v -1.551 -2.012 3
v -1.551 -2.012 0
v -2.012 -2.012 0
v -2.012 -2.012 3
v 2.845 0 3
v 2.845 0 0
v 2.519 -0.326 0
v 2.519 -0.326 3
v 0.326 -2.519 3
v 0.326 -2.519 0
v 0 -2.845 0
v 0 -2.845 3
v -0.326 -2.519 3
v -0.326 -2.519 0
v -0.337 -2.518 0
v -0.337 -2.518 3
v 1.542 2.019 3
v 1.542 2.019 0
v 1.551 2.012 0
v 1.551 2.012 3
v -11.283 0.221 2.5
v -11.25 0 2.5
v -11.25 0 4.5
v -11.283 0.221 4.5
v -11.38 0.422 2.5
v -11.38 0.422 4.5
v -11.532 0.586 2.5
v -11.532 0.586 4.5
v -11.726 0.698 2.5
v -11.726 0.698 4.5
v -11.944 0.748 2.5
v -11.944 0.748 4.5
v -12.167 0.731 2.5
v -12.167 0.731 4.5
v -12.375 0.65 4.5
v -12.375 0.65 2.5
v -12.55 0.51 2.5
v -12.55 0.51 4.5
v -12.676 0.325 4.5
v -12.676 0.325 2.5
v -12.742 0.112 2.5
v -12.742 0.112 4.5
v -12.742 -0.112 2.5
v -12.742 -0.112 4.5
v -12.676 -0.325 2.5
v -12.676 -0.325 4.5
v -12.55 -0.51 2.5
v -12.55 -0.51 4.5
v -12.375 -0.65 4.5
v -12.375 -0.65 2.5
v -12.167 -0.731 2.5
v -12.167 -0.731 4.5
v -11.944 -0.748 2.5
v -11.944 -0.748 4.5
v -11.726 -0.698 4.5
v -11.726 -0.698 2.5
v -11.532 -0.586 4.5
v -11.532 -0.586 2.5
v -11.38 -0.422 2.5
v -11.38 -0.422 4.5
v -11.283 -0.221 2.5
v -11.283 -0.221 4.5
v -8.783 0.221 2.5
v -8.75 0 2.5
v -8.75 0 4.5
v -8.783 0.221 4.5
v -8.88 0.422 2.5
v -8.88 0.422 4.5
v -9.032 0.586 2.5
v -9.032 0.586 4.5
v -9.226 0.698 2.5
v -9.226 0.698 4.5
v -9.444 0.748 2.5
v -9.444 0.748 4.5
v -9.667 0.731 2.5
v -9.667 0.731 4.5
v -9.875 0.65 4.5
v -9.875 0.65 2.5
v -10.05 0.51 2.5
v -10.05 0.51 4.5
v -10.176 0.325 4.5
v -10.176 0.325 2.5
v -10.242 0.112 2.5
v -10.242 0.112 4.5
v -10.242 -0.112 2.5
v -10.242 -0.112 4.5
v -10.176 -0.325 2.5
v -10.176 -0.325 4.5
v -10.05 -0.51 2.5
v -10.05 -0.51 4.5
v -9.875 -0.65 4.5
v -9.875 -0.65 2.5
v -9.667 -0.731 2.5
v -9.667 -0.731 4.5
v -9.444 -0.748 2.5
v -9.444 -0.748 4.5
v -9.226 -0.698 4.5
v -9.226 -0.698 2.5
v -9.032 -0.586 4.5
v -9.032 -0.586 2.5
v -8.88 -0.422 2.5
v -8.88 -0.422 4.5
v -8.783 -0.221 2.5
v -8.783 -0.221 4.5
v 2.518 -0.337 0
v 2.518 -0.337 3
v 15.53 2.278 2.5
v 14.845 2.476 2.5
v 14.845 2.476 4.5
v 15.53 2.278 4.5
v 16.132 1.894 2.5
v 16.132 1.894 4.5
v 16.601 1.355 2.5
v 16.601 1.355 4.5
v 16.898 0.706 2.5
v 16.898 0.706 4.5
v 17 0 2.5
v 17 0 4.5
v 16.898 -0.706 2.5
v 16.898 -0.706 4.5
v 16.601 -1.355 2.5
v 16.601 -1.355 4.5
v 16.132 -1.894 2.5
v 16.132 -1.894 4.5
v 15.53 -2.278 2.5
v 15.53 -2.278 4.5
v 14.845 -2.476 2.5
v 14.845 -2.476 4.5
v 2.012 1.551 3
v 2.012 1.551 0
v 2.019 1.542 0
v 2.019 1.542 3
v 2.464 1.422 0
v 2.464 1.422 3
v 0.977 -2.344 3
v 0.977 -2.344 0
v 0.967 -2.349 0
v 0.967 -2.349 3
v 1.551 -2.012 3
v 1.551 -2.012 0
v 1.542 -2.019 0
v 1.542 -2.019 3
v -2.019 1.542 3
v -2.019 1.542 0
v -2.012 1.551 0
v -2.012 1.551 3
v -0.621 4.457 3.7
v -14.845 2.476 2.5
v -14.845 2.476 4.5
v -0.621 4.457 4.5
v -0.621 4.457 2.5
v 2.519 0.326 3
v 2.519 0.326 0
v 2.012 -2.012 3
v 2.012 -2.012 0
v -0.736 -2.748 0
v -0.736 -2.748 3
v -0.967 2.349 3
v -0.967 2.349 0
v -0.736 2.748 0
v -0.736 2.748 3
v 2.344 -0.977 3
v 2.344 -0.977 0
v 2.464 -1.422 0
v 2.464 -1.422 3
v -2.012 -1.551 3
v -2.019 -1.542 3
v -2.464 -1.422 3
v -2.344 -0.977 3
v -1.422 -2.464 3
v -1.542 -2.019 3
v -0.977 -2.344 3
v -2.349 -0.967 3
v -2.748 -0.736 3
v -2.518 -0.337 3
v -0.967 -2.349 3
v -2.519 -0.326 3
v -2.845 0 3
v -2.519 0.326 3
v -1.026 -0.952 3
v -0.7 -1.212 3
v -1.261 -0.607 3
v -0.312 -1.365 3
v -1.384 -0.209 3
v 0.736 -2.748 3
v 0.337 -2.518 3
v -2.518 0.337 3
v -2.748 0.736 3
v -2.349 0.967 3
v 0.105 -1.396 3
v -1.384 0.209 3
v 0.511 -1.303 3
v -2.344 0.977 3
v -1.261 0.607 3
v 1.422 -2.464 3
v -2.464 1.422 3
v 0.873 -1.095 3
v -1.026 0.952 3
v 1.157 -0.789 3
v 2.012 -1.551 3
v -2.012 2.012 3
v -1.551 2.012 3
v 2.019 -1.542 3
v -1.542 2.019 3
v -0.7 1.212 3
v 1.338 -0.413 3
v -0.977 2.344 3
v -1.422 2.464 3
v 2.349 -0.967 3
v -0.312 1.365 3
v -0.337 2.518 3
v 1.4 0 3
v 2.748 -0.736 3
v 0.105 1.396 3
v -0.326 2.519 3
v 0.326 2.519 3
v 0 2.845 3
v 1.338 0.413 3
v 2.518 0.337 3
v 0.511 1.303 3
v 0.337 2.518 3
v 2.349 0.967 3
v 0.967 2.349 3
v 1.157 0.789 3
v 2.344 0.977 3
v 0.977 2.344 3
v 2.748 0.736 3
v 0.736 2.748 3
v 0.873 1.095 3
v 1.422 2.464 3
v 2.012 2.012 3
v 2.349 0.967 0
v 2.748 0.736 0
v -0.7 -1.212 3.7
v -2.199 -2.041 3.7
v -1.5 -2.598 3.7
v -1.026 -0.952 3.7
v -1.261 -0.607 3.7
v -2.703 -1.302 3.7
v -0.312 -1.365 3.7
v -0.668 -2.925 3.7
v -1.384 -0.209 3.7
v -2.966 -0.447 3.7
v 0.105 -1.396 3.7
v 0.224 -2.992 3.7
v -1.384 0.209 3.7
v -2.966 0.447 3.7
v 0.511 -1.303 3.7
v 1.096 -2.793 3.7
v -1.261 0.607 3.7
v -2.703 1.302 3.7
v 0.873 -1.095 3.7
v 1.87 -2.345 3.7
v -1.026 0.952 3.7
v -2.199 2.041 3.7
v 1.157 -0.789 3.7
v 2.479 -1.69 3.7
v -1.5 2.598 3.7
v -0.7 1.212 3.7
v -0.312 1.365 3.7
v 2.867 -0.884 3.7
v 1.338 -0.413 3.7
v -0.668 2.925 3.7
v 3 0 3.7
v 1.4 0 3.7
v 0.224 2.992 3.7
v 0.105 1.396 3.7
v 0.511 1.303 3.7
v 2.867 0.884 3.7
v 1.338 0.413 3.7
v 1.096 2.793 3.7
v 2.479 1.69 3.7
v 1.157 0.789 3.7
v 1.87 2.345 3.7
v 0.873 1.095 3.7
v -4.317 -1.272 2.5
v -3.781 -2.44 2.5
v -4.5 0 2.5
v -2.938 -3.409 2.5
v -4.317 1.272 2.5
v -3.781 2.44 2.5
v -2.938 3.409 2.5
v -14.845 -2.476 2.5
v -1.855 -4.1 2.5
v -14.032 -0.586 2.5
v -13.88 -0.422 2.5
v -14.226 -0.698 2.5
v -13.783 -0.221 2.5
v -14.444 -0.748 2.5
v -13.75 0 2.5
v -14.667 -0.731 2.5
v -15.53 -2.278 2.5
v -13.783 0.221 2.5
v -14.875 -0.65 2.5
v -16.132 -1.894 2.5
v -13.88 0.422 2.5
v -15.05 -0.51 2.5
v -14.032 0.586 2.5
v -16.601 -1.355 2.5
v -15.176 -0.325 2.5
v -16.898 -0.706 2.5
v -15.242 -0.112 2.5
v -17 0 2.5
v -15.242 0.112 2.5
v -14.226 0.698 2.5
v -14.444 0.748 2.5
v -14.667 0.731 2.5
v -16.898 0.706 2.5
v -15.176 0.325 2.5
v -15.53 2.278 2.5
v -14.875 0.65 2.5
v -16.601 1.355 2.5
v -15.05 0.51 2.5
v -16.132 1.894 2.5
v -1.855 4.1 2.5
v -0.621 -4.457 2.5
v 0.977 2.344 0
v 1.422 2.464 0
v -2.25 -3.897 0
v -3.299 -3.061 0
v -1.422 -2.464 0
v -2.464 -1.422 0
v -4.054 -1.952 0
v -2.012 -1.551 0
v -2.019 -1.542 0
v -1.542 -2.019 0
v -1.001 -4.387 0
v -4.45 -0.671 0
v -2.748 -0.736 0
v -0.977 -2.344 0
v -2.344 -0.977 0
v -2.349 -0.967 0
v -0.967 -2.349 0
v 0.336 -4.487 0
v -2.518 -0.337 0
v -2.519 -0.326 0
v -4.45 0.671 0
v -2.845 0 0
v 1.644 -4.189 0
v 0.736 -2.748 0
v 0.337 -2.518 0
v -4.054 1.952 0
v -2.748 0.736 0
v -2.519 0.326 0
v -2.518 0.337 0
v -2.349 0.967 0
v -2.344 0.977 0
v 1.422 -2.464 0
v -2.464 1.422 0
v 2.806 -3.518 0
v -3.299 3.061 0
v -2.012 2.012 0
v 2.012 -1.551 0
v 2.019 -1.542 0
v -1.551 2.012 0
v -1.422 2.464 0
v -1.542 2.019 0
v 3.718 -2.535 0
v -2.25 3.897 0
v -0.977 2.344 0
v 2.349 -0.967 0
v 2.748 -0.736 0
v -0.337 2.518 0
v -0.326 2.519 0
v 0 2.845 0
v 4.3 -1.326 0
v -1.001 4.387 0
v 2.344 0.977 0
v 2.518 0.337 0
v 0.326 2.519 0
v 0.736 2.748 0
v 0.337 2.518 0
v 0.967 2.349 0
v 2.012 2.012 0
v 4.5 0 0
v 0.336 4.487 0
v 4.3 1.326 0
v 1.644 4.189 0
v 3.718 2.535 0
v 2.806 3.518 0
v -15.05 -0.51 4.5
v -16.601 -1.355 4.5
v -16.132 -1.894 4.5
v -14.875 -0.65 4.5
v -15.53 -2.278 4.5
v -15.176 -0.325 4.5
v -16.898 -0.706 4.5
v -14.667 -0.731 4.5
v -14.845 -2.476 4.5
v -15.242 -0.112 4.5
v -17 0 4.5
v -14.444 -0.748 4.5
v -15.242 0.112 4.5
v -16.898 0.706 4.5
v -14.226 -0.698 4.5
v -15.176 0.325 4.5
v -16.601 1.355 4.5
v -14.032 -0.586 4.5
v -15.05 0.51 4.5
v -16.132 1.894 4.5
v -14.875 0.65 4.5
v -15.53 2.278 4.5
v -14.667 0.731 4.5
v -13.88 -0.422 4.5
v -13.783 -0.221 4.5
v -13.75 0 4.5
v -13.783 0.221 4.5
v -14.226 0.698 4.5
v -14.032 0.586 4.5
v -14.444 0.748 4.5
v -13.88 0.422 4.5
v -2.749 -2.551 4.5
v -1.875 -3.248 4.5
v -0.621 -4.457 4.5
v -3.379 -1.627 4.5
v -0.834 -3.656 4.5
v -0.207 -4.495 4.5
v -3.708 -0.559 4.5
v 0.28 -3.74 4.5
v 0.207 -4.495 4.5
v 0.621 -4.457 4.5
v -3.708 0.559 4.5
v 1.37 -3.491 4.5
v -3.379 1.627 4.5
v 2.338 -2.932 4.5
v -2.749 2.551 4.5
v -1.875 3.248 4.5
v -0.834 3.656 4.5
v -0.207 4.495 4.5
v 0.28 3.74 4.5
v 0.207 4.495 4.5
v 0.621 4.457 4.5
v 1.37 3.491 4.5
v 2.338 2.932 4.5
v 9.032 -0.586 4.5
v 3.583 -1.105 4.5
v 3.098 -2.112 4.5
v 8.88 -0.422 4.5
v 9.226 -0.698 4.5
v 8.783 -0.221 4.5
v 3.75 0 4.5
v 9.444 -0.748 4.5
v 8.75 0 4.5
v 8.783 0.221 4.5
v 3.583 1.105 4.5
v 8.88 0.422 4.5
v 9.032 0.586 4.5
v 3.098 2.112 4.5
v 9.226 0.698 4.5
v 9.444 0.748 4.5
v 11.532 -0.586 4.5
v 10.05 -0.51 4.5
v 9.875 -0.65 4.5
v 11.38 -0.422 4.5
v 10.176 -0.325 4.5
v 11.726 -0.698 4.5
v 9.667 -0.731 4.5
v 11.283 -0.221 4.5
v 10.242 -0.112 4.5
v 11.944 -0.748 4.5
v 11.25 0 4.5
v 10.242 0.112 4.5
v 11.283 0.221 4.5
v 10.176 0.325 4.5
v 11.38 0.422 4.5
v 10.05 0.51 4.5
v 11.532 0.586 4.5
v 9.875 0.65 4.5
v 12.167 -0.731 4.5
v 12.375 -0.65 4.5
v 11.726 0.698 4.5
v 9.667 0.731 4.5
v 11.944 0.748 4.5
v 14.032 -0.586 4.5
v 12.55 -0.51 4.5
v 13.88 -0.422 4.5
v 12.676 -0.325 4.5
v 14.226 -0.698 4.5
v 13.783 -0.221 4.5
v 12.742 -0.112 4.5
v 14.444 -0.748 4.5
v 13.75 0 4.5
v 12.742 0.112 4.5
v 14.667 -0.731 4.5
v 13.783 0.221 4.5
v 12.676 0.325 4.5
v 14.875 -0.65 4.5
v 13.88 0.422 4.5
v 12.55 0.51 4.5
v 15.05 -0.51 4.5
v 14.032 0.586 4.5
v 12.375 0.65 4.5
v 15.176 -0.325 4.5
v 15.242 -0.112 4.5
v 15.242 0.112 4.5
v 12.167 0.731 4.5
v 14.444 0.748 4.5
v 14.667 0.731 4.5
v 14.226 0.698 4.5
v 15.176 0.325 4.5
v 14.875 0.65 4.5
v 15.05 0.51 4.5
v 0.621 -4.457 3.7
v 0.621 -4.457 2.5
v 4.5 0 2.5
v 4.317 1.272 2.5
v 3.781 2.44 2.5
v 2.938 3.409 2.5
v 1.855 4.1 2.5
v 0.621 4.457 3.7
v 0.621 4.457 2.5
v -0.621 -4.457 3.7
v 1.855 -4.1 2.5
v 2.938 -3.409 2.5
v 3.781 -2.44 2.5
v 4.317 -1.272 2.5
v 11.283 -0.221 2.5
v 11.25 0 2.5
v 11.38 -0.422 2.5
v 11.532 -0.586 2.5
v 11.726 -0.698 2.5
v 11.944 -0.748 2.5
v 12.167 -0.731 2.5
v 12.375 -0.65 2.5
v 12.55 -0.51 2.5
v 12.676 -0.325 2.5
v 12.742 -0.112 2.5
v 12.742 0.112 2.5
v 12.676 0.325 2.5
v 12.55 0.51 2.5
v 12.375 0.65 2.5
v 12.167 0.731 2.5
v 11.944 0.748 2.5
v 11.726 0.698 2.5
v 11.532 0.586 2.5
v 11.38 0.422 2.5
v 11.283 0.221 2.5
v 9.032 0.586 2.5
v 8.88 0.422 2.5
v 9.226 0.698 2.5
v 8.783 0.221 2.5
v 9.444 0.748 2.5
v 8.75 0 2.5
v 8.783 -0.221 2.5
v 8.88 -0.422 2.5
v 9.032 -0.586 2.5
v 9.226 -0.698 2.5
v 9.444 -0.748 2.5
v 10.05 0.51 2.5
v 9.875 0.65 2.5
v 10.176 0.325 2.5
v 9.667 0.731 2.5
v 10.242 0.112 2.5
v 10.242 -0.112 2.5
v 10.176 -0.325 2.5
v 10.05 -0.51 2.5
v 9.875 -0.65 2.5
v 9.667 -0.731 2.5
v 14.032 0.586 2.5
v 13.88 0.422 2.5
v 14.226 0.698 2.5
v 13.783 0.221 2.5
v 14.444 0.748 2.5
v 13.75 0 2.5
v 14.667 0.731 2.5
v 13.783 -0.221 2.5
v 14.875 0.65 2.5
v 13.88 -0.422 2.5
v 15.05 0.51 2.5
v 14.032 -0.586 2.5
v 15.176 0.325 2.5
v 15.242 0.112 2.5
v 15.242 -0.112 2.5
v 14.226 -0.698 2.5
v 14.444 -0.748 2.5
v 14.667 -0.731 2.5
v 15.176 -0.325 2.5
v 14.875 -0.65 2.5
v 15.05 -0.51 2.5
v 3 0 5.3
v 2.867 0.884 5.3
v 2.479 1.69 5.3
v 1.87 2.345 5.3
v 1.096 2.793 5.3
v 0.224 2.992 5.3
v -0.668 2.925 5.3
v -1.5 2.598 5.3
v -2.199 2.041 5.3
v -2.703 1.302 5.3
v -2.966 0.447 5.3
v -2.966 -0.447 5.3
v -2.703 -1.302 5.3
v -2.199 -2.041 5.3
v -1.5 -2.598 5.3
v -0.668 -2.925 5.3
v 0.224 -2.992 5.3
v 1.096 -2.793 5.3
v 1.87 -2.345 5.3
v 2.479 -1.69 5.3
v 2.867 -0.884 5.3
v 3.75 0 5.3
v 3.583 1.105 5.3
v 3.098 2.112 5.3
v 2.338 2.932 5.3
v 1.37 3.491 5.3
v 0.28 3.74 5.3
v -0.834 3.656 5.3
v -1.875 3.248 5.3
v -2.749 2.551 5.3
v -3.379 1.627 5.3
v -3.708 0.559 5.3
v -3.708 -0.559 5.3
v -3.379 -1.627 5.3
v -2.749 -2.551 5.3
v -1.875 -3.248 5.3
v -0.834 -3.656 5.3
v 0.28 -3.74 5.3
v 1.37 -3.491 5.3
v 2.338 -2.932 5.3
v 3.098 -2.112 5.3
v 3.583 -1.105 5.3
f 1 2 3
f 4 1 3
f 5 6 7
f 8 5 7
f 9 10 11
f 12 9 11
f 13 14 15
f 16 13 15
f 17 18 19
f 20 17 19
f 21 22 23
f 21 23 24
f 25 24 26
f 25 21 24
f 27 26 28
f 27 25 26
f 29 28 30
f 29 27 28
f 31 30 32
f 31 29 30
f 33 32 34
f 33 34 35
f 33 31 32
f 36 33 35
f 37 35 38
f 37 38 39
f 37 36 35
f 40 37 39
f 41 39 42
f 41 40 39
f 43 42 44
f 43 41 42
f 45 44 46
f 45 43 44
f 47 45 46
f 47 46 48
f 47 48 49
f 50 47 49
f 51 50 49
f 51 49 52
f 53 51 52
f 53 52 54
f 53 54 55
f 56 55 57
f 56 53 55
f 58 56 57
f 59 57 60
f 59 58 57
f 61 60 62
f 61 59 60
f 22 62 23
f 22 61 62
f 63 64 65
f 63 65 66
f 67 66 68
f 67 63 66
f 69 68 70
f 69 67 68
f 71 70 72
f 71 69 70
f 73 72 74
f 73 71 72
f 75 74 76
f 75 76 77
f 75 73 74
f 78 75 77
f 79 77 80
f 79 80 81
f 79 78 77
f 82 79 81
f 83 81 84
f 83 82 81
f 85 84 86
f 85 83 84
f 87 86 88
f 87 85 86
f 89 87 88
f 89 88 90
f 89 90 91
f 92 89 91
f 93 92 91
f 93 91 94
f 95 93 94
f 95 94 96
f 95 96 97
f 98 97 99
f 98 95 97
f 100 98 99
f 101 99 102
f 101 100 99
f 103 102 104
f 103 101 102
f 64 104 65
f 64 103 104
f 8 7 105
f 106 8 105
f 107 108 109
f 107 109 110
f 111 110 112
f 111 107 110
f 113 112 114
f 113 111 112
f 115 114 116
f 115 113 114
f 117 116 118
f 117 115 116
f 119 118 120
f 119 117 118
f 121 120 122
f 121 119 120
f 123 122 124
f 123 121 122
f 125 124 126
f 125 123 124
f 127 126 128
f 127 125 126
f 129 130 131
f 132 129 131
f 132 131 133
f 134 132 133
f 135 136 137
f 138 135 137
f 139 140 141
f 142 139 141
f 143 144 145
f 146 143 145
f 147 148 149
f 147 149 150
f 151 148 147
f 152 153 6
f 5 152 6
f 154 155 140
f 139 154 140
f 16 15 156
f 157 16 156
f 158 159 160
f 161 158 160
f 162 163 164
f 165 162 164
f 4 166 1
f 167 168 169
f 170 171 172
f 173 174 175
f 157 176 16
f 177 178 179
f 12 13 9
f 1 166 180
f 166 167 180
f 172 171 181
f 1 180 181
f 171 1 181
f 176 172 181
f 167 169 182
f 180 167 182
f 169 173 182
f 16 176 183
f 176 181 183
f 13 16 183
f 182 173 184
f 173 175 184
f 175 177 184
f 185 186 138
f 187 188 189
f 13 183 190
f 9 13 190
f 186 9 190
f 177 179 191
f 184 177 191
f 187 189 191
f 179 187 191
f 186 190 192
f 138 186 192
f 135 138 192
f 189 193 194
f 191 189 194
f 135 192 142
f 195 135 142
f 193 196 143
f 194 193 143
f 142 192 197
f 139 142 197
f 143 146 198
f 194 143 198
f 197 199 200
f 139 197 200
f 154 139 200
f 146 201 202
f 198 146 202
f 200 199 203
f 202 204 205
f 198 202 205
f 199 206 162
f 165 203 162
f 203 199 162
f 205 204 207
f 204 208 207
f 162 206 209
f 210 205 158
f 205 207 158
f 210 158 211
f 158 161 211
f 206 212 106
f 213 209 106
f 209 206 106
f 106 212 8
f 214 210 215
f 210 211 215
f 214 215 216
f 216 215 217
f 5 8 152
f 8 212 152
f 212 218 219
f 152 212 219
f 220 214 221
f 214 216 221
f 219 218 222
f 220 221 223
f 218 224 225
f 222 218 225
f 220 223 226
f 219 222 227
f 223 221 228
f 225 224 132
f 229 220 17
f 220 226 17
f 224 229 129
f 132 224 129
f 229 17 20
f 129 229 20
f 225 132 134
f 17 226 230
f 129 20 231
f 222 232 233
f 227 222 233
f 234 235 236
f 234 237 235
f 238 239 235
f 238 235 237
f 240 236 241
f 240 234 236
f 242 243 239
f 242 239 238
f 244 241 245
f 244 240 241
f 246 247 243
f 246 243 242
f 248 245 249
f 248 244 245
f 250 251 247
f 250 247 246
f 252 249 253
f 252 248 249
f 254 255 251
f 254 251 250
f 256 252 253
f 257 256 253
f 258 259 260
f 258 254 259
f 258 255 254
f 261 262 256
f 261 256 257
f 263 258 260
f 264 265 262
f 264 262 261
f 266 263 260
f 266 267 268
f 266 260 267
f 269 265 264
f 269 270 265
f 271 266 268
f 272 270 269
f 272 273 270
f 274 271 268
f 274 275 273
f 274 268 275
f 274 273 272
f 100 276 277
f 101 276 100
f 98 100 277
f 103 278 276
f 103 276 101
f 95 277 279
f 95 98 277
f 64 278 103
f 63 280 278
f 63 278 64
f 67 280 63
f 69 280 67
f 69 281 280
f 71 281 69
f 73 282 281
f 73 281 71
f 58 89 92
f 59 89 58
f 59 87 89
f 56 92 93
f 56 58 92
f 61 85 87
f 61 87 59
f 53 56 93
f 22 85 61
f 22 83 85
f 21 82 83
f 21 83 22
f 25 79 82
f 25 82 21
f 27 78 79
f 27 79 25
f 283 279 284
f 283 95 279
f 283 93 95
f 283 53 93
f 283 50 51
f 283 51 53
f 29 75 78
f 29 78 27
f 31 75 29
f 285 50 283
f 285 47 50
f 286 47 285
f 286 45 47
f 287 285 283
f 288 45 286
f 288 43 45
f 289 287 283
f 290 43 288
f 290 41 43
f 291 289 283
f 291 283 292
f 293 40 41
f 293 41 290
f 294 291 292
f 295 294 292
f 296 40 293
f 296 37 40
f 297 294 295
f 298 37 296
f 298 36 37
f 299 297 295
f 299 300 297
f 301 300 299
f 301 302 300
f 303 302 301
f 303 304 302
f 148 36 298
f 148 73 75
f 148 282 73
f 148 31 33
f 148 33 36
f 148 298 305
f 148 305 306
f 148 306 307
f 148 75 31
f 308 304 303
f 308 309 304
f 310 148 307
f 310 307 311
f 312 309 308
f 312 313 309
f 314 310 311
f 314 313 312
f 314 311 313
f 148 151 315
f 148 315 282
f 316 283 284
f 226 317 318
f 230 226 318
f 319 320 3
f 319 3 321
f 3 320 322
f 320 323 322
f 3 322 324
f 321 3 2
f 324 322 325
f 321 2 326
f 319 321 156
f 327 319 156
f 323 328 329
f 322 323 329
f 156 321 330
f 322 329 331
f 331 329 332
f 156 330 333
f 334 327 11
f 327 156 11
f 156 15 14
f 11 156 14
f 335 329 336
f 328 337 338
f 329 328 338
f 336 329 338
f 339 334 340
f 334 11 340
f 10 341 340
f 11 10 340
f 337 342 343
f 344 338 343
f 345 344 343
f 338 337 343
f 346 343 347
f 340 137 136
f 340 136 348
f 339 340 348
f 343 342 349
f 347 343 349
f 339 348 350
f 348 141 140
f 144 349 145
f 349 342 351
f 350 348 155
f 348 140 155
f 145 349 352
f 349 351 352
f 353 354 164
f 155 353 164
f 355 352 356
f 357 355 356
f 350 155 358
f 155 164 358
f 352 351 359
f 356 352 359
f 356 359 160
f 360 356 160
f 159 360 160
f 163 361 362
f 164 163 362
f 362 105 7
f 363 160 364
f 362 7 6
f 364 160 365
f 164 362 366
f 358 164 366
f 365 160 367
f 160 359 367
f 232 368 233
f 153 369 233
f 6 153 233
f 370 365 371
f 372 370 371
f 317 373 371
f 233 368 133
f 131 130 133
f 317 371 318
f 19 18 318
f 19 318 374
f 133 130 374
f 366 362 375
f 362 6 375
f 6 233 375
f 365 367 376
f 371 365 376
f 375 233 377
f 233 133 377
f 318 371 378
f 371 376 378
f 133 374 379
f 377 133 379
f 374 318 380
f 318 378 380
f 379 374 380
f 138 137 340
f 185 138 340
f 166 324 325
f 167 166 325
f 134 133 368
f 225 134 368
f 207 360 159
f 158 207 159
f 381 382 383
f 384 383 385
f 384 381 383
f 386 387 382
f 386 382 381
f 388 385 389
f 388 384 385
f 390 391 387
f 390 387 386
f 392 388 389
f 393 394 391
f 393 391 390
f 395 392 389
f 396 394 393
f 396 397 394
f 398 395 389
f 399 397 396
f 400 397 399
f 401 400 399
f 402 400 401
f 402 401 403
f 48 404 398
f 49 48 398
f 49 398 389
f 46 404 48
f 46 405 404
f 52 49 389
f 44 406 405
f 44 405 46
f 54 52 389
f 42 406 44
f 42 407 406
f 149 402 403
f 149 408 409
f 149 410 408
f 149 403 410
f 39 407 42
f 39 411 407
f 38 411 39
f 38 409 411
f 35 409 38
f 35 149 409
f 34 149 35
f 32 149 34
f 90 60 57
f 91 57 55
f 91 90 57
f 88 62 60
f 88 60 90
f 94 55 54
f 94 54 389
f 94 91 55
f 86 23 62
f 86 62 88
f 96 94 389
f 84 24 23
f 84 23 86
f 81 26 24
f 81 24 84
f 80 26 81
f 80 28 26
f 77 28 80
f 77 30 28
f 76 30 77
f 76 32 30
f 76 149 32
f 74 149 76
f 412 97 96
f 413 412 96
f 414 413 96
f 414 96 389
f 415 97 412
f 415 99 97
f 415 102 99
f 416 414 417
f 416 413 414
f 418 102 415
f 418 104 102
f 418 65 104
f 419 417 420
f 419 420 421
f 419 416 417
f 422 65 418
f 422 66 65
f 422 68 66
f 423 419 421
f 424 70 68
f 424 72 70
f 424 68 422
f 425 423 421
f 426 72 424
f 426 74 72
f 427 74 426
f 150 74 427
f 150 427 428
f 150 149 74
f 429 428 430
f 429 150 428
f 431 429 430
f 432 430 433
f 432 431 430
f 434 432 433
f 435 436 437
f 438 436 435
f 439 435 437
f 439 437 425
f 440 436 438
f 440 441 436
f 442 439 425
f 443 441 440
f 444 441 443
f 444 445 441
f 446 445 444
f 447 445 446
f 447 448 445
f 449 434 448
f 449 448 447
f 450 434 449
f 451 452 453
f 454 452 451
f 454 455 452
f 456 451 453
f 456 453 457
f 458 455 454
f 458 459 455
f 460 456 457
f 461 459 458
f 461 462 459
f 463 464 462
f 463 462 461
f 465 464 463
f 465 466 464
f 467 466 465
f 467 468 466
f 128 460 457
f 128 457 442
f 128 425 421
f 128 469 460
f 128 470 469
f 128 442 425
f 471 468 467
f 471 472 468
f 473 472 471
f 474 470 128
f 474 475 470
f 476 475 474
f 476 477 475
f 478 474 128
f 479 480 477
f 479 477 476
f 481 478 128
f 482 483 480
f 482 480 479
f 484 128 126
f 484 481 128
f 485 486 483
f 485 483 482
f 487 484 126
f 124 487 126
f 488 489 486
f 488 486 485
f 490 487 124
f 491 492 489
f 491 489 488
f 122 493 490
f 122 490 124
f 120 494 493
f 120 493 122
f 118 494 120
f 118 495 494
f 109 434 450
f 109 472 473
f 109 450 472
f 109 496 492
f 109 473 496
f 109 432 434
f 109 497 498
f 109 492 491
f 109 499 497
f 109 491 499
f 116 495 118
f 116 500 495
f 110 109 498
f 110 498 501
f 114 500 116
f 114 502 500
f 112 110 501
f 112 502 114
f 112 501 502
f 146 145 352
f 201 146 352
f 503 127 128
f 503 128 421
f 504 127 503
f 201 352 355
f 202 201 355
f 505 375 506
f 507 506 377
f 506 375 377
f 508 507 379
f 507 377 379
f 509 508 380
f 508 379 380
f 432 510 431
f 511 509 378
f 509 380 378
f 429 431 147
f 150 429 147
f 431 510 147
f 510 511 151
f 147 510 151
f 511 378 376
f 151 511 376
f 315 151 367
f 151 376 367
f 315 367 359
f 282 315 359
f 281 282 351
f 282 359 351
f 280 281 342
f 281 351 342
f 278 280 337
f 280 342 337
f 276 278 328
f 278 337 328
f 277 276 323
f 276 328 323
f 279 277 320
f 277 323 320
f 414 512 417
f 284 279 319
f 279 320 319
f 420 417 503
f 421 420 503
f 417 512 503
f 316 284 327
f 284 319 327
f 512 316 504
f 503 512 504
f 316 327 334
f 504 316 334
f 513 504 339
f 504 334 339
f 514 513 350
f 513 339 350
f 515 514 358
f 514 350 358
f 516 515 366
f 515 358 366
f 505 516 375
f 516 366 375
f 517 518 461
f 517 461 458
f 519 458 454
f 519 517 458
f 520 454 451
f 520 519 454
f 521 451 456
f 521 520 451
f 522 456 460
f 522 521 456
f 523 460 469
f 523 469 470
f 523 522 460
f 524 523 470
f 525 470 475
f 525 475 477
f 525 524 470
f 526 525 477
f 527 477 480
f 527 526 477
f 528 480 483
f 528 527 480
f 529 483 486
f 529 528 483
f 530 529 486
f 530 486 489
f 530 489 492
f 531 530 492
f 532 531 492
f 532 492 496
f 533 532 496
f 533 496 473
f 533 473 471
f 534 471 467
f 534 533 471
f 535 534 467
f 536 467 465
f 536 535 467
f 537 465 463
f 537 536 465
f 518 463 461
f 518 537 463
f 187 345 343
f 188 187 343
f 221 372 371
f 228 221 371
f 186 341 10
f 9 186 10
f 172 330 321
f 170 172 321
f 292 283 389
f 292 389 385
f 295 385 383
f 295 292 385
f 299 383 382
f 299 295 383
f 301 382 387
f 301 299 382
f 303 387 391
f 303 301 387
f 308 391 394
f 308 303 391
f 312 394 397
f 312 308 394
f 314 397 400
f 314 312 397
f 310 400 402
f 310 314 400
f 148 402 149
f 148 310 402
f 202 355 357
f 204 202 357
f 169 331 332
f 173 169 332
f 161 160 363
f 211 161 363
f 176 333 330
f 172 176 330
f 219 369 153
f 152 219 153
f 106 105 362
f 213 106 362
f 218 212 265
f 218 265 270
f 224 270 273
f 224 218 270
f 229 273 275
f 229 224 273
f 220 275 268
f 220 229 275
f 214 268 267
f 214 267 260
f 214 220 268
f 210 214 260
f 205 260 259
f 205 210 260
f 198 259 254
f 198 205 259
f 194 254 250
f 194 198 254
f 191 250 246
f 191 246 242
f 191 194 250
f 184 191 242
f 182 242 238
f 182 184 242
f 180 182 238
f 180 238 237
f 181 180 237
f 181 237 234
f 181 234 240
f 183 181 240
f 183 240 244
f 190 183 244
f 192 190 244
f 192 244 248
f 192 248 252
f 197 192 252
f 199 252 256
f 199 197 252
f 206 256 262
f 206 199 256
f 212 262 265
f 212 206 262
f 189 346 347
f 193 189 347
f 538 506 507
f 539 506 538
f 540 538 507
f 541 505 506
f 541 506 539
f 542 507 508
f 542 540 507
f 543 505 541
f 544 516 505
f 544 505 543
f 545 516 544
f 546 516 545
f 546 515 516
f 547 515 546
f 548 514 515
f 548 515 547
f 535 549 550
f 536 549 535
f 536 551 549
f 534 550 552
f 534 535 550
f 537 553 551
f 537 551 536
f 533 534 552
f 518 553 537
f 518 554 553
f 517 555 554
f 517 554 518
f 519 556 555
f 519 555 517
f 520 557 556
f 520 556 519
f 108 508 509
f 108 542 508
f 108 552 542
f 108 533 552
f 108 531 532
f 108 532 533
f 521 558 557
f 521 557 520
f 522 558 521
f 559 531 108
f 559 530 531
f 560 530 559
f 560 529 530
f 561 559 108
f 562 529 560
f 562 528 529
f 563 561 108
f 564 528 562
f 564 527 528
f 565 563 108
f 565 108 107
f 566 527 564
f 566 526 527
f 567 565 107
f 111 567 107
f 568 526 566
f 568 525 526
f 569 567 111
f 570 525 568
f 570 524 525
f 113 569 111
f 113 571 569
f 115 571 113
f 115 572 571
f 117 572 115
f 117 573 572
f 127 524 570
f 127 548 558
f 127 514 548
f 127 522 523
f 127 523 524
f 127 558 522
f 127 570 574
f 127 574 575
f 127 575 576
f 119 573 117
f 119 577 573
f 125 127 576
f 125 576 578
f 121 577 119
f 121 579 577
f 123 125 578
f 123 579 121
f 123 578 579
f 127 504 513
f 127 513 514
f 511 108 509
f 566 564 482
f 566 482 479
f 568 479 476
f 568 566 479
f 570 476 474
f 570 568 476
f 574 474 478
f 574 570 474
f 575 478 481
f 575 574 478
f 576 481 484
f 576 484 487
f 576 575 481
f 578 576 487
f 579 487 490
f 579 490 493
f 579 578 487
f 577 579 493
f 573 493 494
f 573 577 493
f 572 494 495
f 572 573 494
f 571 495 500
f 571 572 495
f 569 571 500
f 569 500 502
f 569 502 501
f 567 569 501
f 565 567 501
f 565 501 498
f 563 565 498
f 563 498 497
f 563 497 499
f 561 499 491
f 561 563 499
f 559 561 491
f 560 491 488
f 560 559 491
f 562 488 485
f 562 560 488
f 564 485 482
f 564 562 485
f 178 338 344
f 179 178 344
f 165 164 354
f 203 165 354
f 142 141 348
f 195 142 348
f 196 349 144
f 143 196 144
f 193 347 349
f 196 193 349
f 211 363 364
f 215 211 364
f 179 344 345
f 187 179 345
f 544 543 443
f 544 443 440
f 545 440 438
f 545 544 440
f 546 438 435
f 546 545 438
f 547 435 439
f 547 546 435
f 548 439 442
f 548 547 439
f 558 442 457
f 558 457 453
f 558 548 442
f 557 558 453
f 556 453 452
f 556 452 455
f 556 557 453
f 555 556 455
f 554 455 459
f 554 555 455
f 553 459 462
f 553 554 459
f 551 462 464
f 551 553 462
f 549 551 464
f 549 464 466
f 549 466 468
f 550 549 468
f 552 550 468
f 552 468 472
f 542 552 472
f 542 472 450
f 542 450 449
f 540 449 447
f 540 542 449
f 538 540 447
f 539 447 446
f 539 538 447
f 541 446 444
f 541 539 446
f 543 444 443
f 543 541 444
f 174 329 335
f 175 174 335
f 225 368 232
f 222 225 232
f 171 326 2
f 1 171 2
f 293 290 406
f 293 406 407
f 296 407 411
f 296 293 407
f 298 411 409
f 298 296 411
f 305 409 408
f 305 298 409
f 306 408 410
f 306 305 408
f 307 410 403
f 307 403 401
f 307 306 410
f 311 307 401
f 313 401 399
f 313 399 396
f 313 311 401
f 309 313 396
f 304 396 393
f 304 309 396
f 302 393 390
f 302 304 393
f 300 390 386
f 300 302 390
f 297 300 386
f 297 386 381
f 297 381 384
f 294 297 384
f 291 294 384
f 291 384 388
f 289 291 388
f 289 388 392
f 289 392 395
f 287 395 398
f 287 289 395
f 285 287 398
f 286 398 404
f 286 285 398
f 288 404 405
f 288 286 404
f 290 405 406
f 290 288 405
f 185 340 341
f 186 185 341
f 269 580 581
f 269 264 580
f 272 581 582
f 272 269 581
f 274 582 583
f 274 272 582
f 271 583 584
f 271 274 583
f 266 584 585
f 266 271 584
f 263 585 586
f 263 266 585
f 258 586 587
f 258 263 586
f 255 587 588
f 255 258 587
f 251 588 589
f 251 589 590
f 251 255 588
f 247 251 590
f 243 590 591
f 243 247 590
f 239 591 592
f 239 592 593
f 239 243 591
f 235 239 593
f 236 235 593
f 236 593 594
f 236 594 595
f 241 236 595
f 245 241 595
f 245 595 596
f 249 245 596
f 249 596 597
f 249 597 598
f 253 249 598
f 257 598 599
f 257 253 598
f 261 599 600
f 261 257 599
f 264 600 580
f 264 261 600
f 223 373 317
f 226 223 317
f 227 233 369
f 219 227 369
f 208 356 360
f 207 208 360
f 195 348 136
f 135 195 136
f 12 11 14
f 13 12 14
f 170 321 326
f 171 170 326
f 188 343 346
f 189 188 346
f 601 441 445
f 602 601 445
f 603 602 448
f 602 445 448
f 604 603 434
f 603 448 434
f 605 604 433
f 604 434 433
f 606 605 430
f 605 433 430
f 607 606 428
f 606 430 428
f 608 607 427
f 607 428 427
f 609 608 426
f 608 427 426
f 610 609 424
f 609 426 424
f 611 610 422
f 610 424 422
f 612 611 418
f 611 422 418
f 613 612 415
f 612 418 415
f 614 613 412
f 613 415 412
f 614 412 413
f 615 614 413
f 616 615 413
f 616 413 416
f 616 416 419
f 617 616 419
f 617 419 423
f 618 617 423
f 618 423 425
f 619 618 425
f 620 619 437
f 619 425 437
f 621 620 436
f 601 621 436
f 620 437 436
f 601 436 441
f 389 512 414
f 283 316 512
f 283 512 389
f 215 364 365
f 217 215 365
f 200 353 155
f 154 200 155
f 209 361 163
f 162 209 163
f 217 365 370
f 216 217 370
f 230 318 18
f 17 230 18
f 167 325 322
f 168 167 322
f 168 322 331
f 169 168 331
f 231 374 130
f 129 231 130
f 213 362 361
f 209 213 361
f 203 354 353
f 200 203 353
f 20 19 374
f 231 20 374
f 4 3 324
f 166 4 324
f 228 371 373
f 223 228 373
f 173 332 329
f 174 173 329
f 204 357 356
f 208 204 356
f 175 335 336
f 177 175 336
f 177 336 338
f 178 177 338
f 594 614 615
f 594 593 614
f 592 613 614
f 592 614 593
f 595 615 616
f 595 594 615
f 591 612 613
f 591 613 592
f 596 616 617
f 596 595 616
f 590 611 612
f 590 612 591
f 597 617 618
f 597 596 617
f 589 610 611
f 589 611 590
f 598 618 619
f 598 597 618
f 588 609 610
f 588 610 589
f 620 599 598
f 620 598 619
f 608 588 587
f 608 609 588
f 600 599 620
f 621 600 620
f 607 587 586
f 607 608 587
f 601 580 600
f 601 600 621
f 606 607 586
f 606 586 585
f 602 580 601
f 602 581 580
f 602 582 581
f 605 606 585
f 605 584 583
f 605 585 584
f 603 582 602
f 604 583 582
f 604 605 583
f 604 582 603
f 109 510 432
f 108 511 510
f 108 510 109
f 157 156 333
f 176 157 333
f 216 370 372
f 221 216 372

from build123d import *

# Parameters (mm, degrees)
ESQUISSE1_R                  = 4.5
BOSS_EXTRU_1_DEPTH           = 3
BOSS_EXTRU_2_START           = -0.5
ESQUISSE2_R                  = 0.75
BOSS_EXTRU_2_DEPTH           = 2
R_P_TITION_CIRCULAIRE1_COUNT = 2
ESQUISSE5_R                  = 4.5
ESQUISSE5_R_2                = 1.4
BOSS_EXTRU_4_DEPTH           = 0.7
ESQUISSE6_R                  = 4.5
ESQUISSE6_R_2                = 3
BOSS_EXTRU_5_DEPTH           = 0.8
ESQUISSE7_R                  = 3.75
ESQUISSE7_R_2                = 3
BOSS_EXTRU_6_DEPTH           = 0.8


with BuildPart() as part:
    # Esquisse1 → Boss.-Extru.1 (new body)
    with BuildSketch(Plane.XY):
        Circle(ESQUISSE1_R)
        Polygon((2.011577371, -1.550856692), (2.011577371, -2.011577371), (1.550856692, -2.011577371), (1.541643286, -2.018647066), (1.4224, -2.463669069), (0.977377998, -2.344425783), (0.966648759, -2.348869979), (0.73628842, -2.747865791), (0.337292608, -2.517505451), (0.325778716, -2.519021284), (0, -2.8448), (-0.325778716, -2.519021284), (-0.337292608, -2.517505451), (-0.73628842, -2.747865791), (-0.966648759, -2.348869979), (-0.977377998, -2.344425783), (-1.4224, -2.463669069), (-1.541643286, -2.018647066), (-1.550856692, -2.011577371), (-2.011577371, -2.011577371), (-2.011577371, -1.550856692), (-2.018647066, -1.541643286), (-2.463669069, -1.4224), (-2.344425783, -0.977377998), (-2.348869979, -0.966648759), (-2.747865791, -0.73628842), (-2.517505451, -0.337292608), (-2.519021284, -0.325778716), (-2.8448, 0), (-2.519021284, 0.325778716), (-2.517505451, 0.337292608), (-2.747865791, 0.73628842), (-2.348869979, 0.966648759), (-2.344425783, 0.977377998), (-2.463669069, 1.4224), (-2.018647066, 1.541643286), (-2.011577371, 1.550856692), (-2.011577371, 2.011577371), (-1.550856692, 2.011577371), (-1.541643286, 2.018647066), (-1.4224, 2.463669069), (-0.977377998, 2.344425783), (-0.966648759, 2.348869979), (-0.73628842, 2.747865791), (-0.337292608, 2.517505451), (-0.325778716, 2.519021284), (0, 2.8448), (0.325778716, 2.519021284), (0.337292608, 2.517505451), (0.73628842, 2.747865791), (0.966648759, 2.348869979), (0.977377998, 2.344425783), (1.4224, 2.463669069), (1.541643286, 2.018647066), (1.550856692, 2.011577371), (2.011577371, 2.011577371), (2.011577371, 1.550856692), (2.018647066, 1.541643286), (2.463669069, 1.4224), (2.344425783, 0.977377998), (2.348869979, 0.966648759), (2.747865791, 0.73628842), (2.517505451, 0.337292608), (2.519021284, 0.325778716), (2.8448, 0), (2.519021284, -0.325778716), (2.517505451, -0.337292608), (2.747865791, -0.73628842), (2.348869979, -0.966648759), (2.344425783, -0.977377998), (2.463669069, -1.4224), (2.018647066, -1.541643286), align=None, mode=Mode.SUBTRACT)
    extrude(amount=BOSS_EXTRU_1_DEPTH)

    # Esquisse2 → Boss.-Extru.2 (add)
    with BuildSketch(Plane.XY.offset(3).offset(BOSS_EXTRU_2_START)):
        with BuildLine():
            Line((-14.844827586, 2.476104589), (-0.620689655, 4.45698826))
            ThreePointArc((-0.620689655, 4.45698826), (-4.5, 0), (-0.620689655, -4.45698826))
            Line((-0.620689655, -4.45698826), (-14.844827586, -2.476104589))
            ThreePointArc((-14.844827586, -2.476104589), (-17, 0), (-14.844827586, 2.476104589))
        make_face()
        with Locations((-14.5, 0)):
            Circle(ESQUISSE2_R, mode=Mode.SUBTRACT)
        with Locations((-12, 0)):
            Circle(ESQUISSE2_R, mode=Mode.SUBTRACT)
        with Locations((-9.5, 0)):
            Circle(ESQUISSE2_R, mode=Mode.SUBTRACT)
    boss_extru_2 = extrude(amount=BOSS_EXTRU_2_DEPTH)

    # Répétition circulaire1: Boss.-Extru.2 ×2 about axis
    r_p_tition_circulaire1_axis = Axis((0, 0, 0), (0, 0, 1))
    for i in range(1, R_P_TITION_CIRCULAIRE1_COUNT):
        add(boss_extru_2.rotate(r_p_tition_circulaire1_axis, i * 360 / R_P_TITION_CIRCULAIRE1_COUNT))

    # Esquisse5 → Boss.-Extru.4 (add)
    with BuildSketch(Plane.XY.offset(3)):
        Circle(ESQUISSE5_R)
        Circle(ESQUISSE5_R_2, mode=Mode.SUBTRACT)
    extrude(amount=BOSS_EXTRU_4_DEPTH)

    # Esquisse6 → Boss.-Extru.5 (add)
    with BuildSketch(Plane.XY.offset(3.7)):
        Circle(ESQUISSE6_R)
        Circle(ESQUISSE6_R_2, mode=Mode.SUBTRACT)
    extrude(amount=BOSS_EXTRU_5_DEPTH)

    # Esquisse7 → Boss.-Extru.6 (add)
    with BuildSketch(Plane.XY.offset(4.5)):
        Circle(ESQUISSE7_R)
        Circle(ESQUISSE7_R_2, mode=Mode.SUBTRACT)
    extrude(amount=BOSS_EXTRU_6_DEPTH)


solid = part.part
